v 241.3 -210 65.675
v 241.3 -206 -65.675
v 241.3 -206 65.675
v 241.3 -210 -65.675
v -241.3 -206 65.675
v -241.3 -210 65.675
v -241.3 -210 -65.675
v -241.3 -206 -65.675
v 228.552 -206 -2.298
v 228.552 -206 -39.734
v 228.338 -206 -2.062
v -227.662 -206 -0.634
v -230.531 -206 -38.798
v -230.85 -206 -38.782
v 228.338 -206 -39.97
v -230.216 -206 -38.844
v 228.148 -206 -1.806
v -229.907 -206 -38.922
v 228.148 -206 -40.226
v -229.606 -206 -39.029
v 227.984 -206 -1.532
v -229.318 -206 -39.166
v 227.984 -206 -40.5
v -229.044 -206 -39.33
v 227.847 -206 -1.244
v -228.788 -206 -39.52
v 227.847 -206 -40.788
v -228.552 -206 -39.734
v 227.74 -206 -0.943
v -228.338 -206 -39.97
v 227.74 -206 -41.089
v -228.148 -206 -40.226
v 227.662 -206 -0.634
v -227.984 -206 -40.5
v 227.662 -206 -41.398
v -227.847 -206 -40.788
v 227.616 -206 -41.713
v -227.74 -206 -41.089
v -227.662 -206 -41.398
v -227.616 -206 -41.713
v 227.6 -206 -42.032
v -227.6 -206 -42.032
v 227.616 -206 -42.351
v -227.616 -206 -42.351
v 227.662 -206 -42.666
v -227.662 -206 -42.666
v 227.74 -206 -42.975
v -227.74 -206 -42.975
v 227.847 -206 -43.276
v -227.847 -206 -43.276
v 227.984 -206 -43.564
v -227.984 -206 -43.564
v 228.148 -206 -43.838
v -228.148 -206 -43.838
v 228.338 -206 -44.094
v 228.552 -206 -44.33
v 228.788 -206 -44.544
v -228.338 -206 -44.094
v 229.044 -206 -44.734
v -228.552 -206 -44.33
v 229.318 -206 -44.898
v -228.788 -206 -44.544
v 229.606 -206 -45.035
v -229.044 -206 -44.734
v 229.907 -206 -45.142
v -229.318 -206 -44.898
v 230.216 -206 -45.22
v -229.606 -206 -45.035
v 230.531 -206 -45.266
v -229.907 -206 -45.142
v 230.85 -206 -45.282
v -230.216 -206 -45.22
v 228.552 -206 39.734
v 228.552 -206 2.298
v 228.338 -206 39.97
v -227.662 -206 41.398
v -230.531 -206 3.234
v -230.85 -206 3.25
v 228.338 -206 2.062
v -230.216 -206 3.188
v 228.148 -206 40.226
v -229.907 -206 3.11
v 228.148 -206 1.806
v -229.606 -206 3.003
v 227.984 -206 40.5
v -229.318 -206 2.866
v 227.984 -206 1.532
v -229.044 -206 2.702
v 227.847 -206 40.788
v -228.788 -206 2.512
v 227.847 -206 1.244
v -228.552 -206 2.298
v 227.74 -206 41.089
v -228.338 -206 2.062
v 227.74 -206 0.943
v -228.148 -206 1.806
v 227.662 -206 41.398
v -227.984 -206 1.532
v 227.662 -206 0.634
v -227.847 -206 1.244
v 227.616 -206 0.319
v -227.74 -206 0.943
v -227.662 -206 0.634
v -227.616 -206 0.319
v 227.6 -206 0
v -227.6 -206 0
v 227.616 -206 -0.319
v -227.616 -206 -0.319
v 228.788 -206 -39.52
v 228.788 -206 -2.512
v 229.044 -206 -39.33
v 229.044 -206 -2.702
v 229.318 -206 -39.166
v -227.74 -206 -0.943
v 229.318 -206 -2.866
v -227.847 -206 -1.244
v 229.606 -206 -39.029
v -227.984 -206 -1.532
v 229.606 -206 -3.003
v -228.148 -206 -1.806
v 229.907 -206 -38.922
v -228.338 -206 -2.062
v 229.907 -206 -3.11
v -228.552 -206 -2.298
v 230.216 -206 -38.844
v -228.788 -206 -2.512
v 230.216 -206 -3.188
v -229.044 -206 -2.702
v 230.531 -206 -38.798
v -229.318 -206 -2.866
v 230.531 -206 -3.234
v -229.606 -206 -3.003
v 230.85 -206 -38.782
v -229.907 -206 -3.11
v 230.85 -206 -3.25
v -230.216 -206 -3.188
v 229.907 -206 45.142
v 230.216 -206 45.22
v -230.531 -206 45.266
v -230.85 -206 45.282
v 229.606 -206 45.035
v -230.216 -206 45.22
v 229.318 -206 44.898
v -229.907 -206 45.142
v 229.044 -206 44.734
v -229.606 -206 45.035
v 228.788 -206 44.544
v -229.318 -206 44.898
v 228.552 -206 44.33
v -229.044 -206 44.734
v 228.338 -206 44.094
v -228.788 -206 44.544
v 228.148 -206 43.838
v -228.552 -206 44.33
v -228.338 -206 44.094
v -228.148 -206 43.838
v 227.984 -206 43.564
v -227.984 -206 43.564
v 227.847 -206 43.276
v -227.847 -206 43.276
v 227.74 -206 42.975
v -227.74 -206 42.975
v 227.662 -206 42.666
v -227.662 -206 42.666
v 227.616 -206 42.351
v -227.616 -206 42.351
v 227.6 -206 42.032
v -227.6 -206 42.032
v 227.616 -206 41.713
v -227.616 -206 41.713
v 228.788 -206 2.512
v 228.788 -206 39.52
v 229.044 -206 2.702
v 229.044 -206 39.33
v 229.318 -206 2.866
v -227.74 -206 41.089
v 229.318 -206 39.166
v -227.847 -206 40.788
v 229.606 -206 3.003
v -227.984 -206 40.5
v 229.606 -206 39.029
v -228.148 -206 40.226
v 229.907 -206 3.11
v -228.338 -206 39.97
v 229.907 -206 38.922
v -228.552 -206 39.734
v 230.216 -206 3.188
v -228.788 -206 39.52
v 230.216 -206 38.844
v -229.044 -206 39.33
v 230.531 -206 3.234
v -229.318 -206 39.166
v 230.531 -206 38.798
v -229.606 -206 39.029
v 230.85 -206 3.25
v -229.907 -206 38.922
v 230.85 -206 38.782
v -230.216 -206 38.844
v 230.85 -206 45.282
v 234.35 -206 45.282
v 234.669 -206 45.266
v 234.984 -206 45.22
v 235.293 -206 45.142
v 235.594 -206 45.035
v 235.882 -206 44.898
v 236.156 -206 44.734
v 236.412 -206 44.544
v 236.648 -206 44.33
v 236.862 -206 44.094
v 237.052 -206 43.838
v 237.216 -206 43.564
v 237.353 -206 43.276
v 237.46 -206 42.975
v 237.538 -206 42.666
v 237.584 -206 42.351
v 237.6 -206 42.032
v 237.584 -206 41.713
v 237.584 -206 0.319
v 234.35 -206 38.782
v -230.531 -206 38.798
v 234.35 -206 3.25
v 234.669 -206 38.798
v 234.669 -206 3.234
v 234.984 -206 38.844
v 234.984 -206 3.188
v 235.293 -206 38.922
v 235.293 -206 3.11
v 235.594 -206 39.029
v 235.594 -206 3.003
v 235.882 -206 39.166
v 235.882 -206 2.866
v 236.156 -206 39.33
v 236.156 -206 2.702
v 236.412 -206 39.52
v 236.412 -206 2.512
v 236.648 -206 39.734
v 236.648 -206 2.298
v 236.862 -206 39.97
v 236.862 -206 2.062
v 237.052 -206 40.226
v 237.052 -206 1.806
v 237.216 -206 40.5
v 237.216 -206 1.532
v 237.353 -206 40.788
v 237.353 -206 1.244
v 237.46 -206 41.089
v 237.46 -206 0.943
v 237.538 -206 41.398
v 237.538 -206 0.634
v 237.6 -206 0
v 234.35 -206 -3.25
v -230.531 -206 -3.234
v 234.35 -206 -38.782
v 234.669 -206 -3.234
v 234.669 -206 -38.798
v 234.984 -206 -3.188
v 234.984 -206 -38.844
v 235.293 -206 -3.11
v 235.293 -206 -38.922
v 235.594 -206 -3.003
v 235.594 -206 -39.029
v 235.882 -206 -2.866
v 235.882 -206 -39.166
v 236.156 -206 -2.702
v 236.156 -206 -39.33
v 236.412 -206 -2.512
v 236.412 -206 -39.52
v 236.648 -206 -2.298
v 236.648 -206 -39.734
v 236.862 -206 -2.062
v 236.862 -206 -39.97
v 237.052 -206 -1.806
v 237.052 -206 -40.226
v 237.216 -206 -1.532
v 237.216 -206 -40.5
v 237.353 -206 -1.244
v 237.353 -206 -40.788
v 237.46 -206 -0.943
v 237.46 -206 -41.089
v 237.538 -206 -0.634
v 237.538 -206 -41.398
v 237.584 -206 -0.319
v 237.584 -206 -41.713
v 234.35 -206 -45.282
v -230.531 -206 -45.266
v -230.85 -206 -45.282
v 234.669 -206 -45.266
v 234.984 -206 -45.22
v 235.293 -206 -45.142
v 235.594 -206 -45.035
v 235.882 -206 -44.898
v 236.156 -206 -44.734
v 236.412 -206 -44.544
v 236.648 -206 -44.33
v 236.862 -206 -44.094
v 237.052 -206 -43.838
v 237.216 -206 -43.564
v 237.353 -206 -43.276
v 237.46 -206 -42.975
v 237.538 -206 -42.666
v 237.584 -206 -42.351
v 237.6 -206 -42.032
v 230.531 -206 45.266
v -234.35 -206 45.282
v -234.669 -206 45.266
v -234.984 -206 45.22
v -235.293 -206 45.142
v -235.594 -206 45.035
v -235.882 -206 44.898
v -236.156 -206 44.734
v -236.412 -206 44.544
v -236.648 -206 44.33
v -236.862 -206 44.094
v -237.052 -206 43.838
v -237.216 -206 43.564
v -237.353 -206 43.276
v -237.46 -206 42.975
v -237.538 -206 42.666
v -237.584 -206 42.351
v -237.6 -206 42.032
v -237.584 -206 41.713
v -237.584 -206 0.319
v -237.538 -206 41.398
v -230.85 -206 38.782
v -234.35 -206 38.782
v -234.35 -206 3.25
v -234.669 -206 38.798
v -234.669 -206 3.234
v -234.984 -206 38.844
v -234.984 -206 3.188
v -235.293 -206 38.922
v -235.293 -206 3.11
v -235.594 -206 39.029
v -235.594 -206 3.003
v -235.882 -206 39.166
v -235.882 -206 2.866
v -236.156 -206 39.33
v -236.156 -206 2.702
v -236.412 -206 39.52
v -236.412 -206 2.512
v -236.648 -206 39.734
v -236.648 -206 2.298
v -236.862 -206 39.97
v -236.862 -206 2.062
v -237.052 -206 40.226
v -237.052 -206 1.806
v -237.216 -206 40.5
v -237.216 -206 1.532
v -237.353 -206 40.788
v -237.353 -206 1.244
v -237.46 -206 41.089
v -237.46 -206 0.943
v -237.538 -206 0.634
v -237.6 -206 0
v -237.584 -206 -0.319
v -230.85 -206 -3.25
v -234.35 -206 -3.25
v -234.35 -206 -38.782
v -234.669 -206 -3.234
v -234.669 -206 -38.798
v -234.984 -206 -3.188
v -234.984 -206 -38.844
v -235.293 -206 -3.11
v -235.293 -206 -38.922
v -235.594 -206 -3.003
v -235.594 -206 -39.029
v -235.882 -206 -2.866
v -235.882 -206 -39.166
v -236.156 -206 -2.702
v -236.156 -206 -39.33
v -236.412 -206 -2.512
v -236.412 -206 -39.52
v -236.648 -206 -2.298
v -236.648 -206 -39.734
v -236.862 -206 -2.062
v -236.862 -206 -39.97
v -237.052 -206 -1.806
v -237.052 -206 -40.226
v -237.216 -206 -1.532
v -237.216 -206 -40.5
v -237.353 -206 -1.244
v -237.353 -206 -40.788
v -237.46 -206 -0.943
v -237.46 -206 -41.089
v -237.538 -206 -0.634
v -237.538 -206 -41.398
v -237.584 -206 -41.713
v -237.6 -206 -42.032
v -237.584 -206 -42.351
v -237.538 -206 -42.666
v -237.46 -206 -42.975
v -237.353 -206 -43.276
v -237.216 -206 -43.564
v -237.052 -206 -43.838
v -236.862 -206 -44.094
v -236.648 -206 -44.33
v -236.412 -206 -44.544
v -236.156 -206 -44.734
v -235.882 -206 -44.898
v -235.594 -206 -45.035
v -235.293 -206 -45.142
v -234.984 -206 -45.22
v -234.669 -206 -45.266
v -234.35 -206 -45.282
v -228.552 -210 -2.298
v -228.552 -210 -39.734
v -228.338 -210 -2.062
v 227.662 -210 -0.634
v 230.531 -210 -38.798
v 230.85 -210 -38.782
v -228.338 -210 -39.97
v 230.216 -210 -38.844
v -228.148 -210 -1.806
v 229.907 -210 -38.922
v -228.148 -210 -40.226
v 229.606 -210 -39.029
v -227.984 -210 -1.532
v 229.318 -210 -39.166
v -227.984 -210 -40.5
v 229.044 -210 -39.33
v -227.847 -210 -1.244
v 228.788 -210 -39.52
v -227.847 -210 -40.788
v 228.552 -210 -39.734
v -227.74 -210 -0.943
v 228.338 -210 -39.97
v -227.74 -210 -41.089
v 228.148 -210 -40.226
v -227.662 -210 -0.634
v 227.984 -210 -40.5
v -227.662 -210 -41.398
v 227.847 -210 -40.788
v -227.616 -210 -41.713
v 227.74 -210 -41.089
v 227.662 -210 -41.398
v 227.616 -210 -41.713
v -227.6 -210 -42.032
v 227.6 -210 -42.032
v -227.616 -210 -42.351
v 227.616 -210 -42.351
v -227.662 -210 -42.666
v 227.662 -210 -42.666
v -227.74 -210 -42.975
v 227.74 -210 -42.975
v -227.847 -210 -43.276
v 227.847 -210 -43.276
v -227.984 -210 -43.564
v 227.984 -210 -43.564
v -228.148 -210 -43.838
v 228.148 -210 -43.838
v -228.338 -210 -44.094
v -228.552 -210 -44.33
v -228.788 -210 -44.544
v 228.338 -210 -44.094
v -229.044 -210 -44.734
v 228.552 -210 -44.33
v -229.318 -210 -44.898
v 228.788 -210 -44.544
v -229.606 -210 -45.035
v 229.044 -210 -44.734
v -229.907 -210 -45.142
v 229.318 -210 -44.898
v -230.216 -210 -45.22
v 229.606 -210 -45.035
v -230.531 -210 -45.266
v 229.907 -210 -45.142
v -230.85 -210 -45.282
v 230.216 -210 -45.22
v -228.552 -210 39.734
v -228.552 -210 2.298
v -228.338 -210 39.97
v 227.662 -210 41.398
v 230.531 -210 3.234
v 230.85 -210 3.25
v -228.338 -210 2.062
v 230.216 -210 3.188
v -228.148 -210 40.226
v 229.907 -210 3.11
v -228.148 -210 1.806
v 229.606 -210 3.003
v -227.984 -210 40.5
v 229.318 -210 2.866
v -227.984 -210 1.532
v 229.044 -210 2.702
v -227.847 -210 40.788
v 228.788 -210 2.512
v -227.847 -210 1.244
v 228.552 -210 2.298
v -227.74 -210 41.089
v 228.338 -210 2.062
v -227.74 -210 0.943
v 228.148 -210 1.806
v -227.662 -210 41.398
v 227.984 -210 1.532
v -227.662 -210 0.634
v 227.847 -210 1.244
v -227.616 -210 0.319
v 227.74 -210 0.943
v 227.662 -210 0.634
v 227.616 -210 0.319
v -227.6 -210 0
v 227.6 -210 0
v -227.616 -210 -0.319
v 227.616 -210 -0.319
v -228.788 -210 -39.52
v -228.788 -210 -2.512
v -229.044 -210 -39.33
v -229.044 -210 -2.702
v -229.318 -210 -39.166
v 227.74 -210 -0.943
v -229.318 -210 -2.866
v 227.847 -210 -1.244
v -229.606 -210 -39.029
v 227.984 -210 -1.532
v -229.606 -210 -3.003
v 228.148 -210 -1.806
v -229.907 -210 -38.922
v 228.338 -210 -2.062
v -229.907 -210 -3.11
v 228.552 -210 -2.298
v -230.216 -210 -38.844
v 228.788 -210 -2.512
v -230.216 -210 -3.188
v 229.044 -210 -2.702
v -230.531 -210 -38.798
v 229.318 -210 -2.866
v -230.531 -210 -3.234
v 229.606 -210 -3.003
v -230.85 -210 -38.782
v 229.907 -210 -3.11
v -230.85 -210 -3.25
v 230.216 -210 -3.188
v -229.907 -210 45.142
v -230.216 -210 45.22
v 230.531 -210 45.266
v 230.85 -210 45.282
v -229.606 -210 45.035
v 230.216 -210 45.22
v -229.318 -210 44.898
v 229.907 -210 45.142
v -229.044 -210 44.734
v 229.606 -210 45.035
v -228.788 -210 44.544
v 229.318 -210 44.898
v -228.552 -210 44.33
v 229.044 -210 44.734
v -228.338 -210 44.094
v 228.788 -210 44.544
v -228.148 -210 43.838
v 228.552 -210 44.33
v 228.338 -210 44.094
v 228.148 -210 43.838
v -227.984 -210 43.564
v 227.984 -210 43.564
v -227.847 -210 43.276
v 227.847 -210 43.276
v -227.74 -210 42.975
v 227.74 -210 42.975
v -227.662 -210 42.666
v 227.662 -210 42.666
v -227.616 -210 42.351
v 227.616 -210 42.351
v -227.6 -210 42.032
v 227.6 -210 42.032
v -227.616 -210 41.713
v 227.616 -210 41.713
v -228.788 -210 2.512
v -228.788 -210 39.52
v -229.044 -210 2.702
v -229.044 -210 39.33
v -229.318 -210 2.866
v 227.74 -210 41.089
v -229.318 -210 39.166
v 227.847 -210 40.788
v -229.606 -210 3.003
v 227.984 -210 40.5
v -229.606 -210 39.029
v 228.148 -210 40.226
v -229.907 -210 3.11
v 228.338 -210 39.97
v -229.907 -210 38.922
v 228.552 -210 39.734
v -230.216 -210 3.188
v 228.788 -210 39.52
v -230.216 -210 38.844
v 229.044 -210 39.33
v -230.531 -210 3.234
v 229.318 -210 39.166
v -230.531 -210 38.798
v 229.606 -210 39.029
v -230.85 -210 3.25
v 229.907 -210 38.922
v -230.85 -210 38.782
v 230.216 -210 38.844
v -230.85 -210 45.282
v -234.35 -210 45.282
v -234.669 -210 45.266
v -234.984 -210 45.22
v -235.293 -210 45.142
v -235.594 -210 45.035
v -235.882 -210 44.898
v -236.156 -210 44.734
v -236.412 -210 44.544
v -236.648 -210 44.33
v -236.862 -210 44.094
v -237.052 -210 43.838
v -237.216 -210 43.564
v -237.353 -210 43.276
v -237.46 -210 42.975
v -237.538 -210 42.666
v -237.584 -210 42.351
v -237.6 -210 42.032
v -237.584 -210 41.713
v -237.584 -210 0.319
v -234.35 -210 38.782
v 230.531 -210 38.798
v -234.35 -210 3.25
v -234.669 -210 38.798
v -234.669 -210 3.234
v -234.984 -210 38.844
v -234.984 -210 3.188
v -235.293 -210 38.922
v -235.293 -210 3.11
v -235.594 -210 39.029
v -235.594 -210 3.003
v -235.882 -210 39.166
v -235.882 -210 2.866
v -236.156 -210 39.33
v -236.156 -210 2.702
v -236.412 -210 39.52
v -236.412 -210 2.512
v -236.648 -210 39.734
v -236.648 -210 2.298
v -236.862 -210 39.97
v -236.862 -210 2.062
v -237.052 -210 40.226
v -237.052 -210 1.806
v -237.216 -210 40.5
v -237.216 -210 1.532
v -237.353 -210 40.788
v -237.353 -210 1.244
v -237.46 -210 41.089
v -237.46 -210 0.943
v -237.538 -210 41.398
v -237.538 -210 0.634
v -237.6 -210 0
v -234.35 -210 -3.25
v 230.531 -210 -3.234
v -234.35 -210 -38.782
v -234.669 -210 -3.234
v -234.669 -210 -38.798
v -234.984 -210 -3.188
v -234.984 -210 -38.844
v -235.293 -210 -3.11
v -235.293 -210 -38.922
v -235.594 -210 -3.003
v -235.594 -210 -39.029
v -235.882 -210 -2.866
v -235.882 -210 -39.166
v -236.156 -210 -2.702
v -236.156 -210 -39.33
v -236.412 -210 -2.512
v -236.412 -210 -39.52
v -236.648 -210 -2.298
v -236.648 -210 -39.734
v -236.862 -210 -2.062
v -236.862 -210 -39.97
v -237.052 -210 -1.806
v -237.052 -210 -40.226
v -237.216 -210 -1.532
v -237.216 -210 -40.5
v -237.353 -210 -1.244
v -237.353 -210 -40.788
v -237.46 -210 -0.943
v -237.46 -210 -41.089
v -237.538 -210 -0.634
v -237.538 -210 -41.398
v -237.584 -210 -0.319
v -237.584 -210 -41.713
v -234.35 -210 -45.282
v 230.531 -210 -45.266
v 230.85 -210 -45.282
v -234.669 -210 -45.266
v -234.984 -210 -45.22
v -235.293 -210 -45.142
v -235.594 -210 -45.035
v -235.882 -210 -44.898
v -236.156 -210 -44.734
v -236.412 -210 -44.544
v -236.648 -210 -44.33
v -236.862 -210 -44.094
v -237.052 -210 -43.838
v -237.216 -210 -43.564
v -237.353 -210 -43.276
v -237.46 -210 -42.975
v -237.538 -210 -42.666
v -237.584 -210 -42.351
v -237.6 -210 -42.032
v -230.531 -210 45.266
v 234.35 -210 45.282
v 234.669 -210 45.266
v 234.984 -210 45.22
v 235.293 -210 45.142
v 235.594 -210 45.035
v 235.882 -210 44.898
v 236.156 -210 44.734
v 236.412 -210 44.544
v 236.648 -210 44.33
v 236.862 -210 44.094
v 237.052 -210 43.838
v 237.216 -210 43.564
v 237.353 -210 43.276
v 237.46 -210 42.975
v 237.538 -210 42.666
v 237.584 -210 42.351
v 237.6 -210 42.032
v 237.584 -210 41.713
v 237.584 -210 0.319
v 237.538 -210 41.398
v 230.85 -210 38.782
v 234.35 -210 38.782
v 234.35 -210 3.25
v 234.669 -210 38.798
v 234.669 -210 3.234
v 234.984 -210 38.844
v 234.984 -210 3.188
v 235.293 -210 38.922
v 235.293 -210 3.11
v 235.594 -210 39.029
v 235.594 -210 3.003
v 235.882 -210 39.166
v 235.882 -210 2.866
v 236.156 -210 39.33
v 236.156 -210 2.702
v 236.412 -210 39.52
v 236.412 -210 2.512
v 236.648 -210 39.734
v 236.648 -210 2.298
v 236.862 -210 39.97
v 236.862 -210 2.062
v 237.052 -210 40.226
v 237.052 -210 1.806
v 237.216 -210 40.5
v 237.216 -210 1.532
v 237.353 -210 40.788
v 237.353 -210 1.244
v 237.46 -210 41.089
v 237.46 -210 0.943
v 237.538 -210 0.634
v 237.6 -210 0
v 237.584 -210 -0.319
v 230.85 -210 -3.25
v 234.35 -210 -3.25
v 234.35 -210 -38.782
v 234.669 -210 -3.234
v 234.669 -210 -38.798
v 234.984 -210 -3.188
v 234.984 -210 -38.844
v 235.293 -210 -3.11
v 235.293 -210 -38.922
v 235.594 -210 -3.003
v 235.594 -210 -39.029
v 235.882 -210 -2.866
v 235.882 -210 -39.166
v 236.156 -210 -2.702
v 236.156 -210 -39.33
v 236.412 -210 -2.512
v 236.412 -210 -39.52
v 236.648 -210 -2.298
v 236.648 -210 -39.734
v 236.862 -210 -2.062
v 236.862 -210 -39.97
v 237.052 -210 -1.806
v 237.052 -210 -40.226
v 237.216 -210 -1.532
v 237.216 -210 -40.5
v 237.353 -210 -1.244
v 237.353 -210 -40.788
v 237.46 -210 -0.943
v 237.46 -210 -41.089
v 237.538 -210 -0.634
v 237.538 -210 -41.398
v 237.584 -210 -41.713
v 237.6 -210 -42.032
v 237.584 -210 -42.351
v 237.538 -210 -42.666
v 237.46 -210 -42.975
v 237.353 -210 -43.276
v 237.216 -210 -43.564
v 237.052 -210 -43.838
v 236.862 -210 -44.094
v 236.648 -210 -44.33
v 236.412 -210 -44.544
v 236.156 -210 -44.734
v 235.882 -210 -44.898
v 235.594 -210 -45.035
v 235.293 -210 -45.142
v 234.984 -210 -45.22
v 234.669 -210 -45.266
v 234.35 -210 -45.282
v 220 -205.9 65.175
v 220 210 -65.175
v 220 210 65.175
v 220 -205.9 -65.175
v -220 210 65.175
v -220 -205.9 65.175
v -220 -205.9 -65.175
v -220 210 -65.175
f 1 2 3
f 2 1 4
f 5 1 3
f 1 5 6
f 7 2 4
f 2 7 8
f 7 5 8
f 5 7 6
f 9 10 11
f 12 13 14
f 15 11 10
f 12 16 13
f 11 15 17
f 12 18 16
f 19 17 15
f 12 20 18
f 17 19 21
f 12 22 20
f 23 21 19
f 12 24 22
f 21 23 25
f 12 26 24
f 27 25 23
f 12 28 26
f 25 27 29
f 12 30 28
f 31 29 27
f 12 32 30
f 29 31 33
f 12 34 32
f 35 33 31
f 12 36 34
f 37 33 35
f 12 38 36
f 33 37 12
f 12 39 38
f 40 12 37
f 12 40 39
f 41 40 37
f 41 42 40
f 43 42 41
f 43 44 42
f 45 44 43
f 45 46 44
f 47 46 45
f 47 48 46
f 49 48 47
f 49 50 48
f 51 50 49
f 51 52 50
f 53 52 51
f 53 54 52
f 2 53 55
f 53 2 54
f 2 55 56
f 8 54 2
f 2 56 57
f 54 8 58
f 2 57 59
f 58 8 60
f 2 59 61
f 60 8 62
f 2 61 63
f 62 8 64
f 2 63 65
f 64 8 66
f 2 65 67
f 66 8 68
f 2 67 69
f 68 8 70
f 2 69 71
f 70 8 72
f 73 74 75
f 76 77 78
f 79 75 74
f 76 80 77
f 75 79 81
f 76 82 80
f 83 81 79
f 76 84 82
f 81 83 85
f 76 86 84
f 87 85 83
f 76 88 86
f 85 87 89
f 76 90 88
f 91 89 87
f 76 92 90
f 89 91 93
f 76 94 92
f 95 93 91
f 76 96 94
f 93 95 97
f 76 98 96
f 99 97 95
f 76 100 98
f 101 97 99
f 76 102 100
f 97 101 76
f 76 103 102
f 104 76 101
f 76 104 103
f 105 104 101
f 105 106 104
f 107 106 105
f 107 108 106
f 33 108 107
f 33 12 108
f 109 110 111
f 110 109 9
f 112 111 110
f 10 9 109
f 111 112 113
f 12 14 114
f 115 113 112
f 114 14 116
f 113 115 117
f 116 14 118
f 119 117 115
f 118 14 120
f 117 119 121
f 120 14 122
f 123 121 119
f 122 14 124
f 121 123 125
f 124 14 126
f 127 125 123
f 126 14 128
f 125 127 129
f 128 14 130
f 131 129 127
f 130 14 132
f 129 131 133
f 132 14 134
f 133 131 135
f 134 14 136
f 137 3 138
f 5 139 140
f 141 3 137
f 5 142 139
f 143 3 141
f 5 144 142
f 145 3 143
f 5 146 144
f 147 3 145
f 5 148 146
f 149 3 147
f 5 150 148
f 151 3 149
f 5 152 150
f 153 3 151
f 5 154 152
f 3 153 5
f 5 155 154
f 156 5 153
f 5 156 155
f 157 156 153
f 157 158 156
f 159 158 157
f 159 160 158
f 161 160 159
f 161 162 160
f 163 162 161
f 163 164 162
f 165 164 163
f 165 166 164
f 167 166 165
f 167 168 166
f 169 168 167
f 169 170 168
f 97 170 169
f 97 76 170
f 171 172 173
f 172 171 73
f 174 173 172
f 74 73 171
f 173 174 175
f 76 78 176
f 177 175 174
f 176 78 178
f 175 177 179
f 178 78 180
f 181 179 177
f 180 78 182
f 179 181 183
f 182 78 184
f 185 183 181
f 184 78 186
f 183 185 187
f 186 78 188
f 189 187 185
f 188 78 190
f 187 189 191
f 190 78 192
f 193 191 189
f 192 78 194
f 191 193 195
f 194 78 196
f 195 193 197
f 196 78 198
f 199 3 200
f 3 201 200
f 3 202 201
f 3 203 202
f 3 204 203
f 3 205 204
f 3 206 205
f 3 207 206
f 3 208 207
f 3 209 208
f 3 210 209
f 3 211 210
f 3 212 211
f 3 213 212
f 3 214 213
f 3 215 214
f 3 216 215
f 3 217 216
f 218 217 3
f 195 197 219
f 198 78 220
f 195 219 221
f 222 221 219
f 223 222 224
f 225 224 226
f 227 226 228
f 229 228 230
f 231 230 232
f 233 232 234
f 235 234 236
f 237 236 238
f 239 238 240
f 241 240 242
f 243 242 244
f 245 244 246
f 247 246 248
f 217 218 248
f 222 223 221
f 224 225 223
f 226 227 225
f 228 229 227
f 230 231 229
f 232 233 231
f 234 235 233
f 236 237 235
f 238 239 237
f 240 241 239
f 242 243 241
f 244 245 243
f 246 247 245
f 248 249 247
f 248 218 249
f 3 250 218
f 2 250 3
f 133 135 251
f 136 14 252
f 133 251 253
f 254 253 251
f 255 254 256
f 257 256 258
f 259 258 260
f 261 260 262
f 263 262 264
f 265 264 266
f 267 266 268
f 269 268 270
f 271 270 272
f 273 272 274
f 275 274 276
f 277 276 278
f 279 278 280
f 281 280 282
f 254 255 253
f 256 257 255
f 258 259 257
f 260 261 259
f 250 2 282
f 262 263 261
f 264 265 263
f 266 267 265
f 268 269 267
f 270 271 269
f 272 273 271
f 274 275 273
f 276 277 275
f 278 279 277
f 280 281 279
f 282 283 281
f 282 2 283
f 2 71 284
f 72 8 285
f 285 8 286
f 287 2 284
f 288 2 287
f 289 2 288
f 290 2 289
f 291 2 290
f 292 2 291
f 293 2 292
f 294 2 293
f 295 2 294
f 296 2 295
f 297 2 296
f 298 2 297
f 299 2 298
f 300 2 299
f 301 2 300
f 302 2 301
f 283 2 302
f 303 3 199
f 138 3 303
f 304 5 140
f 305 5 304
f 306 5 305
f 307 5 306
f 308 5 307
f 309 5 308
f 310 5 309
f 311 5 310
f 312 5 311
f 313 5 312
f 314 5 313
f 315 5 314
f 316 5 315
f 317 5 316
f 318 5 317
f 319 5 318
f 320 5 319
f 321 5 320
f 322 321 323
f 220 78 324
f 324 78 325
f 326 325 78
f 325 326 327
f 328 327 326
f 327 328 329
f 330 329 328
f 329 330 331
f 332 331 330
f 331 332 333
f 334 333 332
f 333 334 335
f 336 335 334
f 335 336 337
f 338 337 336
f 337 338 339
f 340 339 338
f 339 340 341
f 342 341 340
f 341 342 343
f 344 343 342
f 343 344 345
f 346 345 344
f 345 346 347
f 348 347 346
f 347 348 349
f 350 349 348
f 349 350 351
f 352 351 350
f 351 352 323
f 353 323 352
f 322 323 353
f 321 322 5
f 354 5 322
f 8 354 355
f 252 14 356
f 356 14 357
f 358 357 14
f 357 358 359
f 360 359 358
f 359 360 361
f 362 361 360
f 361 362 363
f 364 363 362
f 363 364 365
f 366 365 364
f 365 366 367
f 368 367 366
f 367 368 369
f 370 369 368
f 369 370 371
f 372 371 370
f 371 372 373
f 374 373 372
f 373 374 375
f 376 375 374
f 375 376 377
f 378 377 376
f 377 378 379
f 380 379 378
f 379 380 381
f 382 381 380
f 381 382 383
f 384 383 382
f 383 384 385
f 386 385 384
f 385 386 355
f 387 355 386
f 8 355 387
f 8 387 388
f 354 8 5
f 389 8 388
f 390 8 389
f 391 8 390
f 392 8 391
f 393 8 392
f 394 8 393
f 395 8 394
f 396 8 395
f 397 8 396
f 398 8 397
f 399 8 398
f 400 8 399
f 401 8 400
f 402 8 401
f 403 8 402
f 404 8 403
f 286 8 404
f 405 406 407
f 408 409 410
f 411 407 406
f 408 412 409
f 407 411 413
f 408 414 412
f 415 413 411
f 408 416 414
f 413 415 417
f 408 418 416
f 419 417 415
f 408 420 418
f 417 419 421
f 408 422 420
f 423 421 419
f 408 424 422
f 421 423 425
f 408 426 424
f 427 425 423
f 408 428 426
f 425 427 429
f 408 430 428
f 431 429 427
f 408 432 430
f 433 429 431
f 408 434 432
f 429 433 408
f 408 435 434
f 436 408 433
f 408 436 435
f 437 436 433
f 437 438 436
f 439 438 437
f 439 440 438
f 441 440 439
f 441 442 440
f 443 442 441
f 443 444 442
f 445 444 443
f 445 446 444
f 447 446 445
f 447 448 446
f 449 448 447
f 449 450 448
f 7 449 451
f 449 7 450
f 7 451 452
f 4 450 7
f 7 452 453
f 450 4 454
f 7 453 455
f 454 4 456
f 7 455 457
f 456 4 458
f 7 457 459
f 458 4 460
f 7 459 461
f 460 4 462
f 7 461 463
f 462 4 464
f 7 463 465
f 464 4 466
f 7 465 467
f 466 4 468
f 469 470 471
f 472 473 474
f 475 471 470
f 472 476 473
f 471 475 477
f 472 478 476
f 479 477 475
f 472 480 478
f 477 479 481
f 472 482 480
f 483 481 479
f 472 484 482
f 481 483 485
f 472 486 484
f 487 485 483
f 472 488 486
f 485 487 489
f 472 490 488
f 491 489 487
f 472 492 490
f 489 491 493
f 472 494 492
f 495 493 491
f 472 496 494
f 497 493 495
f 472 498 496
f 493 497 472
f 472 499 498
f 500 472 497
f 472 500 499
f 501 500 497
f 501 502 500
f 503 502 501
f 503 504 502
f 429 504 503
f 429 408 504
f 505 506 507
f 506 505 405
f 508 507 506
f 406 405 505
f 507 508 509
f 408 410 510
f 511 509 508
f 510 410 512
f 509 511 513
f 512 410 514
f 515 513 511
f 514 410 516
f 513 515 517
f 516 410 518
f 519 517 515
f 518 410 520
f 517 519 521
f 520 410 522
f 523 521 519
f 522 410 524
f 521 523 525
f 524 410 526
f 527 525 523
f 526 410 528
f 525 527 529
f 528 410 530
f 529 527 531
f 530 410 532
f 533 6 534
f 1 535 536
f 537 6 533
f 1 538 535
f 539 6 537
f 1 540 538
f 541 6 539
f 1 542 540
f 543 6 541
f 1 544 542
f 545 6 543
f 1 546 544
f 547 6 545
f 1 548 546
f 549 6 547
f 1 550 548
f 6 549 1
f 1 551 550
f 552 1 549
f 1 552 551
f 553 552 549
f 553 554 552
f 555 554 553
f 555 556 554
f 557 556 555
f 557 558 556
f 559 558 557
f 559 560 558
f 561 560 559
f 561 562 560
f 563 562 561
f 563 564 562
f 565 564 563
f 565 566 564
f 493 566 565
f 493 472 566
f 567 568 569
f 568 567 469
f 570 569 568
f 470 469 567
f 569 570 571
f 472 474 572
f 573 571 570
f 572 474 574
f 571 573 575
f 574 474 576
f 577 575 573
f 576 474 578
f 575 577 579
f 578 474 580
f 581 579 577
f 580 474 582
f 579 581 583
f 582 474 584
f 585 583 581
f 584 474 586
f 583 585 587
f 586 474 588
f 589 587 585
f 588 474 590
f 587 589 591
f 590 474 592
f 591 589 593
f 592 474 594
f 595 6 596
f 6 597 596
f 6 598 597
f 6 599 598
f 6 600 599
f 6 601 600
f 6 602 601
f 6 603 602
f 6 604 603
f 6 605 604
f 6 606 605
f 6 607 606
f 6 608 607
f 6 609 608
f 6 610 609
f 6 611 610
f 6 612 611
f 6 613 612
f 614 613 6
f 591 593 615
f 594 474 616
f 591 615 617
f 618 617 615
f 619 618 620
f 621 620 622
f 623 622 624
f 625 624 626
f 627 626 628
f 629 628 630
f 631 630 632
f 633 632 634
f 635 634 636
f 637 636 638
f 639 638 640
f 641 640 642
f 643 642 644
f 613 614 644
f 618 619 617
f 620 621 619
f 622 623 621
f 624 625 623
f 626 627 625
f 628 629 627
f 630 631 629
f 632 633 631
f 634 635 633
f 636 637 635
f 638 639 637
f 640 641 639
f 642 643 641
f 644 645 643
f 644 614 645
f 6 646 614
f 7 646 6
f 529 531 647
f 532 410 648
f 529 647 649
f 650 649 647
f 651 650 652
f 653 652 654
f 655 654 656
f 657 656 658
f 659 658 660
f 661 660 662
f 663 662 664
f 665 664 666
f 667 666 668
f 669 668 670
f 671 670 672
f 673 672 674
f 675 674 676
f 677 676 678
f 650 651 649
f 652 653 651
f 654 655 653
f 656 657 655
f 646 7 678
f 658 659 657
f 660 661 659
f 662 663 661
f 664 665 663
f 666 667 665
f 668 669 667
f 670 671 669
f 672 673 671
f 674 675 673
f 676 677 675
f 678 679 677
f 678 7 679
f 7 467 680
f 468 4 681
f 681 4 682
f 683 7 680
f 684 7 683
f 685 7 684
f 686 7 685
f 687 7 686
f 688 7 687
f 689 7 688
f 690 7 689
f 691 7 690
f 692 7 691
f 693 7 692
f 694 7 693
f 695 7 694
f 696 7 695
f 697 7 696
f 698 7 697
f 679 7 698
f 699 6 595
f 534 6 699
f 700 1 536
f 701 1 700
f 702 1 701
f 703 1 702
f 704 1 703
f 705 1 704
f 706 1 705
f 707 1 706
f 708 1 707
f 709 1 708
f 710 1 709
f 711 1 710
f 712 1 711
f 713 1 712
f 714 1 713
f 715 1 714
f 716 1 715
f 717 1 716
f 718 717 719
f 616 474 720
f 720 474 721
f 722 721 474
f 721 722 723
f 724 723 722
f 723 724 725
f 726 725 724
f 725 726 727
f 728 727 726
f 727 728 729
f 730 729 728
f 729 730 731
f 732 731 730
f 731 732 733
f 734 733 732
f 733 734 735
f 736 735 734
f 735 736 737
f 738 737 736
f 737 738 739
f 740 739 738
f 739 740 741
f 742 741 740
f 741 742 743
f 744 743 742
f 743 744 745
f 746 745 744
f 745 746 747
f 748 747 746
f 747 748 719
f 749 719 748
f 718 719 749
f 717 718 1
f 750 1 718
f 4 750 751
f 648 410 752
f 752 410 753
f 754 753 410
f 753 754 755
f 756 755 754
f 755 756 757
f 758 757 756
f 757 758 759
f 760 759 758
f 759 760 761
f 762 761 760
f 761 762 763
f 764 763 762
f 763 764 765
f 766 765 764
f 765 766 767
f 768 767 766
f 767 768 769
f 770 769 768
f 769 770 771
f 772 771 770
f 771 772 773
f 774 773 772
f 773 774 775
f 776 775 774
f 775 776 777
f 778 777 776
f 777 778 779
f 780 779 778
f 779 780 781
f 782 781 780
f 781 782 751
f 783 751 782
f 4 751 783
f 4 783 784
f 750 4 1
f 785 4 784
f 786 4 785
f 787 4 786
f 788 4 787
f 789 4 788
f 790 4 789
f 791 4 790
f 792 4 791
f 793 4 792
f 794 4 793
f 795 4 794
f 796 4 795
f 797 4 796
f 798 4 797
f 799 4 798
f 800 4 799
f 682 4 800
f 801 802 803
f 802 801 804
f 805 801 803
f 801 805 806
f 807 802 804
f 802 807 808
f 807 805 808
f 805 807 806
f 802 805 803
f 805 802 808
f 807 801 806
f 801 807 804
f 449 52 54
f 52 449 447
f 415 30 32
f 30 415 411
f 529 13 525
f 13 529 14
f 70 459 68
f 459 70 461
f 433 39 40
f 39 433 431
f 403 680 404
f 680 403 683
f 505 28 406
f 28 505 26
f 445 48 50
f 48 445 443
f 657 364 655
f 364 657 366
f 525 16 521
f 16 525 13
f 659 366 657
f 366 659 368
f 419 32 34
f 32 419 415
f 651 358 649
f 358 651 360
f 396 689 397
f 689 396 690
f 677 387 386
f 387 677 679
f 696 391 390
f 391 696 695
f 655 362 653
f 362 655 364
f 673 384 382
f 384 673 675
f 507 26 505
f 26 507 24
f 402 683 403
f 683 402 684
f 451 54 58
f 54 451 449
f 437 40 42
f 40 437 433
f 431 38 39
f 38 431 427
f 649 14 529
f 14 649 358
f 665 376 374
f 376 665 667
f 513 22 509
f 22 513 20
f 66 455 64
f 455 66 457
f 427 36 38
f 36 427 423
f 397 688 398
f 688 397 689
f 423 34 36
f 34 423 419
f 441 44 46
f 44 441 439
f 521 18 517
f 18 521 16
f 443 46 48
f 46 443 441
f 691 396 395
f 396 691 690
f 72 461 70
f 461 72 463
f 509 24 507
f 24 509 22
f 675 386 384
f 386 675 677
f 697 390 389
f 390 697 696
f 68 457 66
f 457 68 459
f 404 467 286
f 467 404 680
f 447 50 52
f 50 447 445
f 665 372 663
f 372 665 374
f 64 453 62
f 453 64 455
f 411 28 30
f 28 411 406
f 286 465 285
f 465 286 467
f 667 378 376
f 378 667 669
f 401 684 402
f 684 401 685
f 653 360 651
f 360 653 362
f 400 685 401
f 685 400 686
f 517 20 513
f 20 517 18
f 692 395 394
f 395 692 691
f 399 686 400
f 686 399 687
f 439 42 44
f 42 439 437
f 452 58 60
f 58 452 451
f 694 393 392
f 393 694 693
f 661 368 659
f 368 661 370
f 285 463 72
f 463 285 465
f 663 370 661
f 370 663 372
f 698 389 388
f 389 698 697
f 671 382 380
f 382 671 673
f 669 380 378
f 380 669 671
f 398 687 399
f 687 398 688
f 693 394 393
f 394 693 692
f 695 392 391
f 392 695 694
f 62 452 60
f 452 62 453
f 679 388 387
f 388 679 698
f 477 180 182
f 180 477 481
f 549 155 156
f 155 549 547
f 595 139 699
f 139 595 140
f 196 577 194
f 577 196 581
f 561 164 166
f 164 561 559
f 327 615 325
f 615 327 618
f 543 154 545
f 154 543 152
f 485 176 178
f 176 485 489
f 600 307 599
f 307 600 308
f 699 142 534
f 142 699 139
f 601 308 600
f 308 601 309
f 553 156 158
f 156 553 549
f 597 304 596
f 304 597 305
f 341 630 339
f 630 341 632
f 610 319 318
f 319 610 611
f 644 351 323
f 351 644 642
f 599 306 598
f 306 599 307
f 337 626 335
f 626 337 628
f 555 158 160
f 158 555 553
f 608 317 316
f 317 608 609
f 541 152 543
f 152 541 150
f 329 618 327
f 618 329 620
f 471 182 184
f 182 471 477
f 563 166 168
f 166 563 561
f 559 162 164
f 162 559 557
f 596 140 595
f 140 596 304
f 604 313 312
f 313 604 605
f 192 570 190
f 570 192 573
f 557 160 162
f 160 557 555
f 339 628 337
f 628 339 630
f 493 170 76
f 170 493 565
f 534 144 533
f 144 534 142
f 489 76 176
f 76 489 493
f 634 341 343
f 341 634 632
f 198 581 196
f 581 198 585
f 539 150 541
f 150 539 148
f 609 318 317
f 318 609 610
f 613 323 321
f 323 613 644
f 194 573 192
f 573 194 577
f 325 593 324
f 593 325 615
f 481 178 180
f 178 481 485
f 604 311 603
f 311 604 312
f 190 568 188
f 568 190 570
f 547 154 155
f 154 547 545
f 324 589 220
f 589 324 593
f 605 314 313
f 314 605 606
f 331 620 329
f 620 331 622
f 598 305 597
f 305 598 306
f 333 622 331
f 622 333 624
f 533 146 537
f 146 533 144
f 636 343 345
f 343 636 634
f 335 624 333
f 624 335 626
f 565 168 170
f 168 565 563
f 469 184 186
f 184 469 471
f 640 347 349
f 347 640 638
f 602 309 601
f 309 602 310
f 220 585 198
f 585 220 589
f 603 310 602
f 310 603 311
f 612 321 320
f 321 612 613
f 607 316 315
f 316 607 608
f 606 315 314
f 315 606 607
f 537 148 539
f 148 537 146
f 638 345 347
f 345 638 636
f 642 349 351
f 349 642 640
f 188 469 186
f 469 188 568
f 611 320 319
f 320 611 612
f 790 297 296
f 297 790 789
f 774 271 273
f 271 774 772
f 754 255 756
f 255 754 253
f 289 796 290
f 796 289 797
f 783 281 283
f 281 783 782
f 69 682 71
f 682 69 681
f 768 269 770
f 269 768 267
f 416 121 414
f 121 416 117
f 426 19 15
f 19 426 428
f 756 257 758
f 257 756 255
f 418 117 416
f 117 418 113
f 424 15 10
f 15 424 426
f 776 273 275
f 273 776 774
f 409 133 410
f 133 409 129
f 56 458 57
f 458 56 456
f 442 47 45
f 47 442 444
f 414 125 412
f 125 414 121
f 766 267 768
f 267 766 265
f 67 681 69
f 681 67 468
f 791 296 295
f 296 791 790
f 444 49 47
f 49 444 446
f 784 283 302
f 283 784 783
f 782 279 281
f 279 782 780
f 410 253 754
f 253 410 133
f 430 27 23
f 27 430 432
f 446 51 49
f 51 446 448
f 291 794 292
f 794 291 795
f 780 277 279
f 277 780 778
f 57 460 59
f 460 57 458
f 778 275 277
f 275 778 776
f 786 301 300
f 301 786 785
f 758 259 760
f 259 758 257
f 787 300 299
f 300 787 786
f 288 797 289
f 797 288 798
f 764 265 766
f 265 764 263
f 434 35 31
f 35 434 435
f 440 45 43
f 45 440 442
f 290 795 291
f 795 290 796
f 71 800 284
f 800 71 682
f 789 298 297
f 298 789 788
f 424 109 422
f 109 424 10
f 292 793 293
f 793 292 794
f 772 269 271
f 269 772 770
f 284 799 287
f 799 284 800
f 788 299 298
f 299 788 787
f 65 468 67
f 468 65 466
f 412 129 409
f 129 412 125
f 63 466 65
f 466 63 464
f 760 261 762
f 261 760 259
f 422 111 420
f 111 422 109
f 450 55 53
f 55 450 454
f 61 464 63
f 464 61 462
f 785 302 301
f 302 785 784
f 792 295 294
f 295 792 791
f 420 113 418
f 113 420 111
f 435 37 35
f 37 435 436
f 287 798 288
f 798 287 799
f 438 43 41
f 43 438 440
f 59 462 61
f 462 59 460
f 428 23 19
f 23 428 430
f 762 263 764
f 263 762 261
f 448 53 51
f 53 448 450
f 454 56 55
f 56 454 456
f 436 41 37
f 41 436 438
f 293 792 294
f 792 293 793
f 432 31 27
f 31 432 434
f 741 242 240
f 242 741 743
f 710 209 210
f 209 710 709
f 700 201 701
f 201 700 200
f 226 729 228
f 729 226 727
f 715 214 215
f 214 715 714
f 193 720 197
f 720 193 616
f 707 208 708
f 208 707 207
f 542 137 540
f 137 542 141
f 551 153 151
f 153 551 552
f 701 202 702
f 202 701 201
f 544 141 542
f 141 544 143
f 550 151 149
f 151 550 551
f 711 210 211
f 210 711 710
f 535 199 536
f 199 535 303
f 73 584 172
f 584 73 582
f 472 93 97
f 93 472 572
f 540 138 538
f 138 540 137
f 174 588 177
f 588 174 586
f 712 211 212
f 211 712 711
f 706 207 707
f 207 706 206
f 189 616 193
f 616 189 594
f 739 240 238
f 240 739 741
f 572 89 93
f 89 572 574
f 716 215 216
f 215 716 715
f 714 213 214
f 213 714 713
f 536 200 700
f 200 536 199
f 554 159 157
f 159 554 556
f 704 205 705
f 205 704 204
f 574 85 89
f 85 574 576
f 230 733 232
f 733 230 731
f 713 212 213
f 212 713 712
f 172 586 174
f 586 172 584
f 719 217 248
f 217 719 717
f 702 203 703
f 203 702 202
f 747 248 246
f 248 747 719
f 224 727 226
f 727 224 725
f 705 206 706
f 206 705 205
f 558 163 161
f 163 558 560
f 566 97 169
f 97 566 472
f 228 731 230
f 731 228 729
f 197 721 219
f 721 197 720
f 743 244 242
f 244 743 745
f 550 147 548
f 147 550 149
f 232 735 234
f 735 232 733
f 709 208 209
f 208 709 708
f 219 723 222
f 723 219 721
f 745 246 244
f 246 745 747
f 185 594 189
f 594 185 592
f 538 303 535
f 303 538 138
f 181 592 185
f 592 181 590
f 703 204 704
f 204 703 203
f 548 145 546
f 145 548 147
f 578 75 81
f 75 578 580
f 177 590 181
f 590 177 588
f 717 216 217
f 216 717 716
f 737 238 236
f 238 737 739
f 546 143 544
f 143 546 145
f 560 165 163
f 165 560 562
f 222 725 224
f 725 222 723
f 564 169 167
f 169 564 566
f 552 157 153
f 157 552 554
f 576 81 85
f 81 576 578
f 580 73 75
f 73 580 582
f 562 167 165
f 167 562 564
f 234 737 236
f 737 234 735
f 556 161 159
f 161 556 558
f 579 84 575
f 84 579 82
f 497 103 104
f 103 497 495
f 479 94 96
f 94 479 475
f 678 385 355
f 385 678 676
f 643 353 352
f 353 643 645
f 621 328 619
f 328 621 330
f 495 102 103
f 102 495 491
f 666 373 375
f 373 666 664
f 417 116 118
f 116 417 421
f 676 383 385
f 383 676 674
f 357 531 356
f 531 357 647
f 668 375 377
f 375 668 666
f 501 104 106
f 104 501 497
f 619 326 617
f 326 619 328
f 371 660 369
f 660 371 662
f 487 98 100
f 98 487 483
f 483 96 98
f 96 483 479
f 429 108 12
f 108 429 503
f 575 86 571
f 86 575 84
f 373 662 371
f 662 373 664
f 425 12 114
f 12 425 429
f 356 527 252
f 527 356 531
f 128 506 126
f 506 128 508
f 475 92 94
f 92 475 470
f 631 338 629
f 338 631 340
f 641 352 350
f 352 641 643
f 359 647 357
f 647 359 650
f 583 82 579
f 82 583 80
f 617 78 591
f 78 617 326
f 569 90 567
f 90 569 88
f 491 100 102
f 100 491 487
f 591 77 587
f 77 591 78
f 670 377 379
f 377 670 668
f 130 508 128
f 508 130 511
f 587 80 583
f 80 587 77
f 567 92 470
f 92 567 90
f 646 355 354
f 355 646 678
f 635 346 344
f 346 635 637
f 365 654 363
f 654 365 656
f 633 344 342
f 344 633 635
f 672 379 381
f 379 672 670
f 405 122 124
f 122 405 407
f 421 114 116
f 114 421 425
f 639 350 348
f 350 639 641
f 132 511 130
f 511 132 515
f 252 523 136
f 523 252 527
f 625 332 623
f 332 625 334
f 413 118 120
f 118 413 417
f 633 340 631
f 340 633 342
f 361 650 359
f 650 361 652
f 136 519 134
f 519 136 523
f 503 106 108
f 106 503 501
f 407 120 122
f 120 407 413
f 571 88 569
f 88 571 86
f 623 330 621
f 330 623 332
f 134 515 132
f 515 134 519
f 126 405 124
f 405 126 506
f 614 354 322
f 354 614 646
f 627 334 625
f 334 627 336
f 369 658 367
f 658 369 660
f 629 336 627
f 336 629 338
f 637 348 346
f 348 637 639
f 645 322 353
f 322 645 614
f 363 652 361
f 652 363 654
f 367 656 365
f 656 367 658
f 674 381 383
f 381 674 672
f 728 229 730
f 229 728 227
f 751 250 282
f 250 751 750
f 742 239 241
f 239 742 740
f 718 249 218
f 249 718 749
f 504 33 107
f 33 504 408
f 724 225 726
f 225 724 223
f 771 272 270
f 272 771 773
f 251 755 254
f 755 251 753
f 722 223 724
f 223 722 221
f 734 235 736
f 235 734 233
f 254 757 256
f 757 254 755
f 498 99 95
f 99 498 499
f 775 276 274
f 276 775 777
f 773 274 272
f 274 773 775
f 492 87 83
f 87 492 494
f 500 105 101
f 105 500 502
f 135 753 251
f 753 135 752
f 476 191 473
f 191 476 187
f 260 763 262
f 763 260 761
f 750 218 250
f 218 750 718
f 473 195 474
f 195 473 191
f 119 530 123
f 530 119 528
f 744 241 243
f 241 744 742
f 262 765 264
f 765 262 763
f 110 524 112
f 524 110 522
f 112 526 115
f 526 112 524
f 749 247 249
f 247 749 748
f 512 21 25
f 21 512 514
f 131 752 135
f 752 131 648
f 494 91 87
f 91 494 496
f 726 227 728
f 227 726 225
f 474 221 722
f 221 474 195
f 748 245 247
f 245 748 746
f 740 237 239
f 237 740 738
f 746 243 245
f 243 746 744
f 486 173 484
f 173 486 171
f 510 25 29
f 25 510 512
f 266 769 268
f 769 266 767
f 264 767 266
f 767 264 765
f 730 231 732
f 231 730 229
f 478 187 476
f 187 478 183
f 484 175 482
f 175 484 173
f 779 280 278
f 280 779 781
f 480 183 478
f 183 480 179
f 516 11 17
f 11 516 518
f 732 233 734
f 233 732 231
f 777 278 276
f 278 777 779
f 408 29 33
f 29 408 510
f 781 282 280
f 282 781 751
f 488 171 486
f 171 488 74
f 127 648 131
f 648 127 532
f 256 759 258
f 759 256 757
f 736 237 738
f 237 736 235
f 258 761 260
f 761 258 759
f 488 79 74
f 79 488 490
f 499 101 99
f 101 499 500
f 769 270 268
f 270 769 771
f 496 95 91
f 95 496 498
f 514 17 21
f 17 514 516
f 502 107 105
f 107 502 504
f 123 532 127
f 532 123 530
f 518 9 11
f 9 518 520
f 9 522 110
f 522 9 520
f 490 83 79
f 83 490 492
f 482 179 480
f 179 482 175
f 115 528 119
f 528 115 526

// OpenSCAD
// ============================================================================
// Atom Lithography Machine — Parametric OpenSCAD Module (S6.6-05)
// ============================================================================
// part_id           : S6.6-05
// parent_bom_id     : S6.6
// subsystem         : S6
// part_name         : Oda-sicakligi dusuk gurultulu RF yukseltici (Mini-Circuits ZX60 sinifi, 56x)
// material          : Al 6061
// temp_stage        : 300 K (kabin)
// vacuum_grade      : Atmosfer
// tolerance         : ±0.5 dB
// computed_mass_kg  : 12.66906
// envelope_mm       : 482.600 x 432.050 x 131.350
// design_maturity   : M0_M1_DETAILED_CAD_DESIGN_ONLY
// no_lab_measurement: true
// iec61508_certified: false
// semi_s2_certified : false
// Units: millimeters (mm)
// ============================================================================

$fn = 64;

// Nominal bounding envelope parameters (mm)
bbox_x = 482.6000;
bbox_y = 432.0500;
bbox_z = 131.3500;

// Part-specific parametric dimensions
rack_u = 3;
u_start = 19;
n_lna = 56;
gain_db = 20.0;

// Interface / port parameters (mm)

module part_S6_6_05() {
  difference() {
    union() {
      // 19" EIA-310 front bezel panel
      translate([0.000, -208.000, 0.000]) cube([482.600, 4.000, 131.350], center=true);
      // Hollow EMI shielded chassis body
      translate([0.000, 2.050, 0.000]) cube([440.000, 415.900, 130.350], center=true);
    }
    // EIA-310 rack ear slot
    translate([-232.600, -208.000, -42.032]) rotate([90.000, 0.000, 0.000]) {
      hull() {
        translate([-1.750, 0, 0]) cylinder(d=6.500, h=6.000, center=true);
        translate([1.750, 0, 0]) cylinder(d=6.500, h=6.000, center=true);
      }
    }
    // EIA-310 rack ear slot
    translate([-232.600, -208.000, 42.032]) rotate([90.000, 0.000, 0.000]) {
      hull() {
        translate([-1.750, 0, 0]) cylinder(d=6.500, h=6.000, center=true);
        translate([1.750, 0, 0]) cylinder(d=6.500, h=6.000, center=true);
      }
    }
    // EIA-310 rack ear slot
    translate([232.600, -208.000, -42.032]) rotate([90.000, 0.000, 0.000]) {
      hull() {
        translate([-1.750, 0, 0]) cylinder(d=6.500, h=6.000, center=true);
        translate([1.750, 0, 0]) cylinder(d=6.500, h=6.000, center=true);
      }
    }
    // EIA-310 rack ear slot
    translate([232.600, -208.000, 42.032]) rotate([90.000, 0.000, 0.000]) {
      hull() {
        translate([-1.750, 0, 0]) cylinder(d=6.500, h=6.000, center=true);
        translate([1.750, 0, 0]) cylinder(d=6.500, h=6.000, center=true);
      }
    }
    // EIA-310 rack ear slot
    translate([-232.600, -208.000, 0.000]) rotate([90.000, 0.000, 0.000]) {
      hull() {
        translate([-1.750, 0, 0]) cylinder(d=6.500, h=6.000, center=true);
        translate([1.750, 0, 0]) cylinder(d=6.500, h=6.000, center=true);
      }
    }
    // EIA-310 rack ear slot
    translate([232.600, -208.000, 0.000]) rotate([90.000, 0.000, 0.000]) {
      hull() {
        translate([-1.750, 0, 0]) cylinder(d=6.500, h=6.000, center=true);
        translate([1.750, 0, 0]) cylinder(d=6.500, h=6.000, center=true);
      }
    }
  }
}

// World assembly mounting transform (global machine frame, mm / deg):
// translate([2100.000, 0.000, 956.775]) rotate([0.000, 0.000, 0.000]) part_S6_6_05();

part_S6_6_05();
